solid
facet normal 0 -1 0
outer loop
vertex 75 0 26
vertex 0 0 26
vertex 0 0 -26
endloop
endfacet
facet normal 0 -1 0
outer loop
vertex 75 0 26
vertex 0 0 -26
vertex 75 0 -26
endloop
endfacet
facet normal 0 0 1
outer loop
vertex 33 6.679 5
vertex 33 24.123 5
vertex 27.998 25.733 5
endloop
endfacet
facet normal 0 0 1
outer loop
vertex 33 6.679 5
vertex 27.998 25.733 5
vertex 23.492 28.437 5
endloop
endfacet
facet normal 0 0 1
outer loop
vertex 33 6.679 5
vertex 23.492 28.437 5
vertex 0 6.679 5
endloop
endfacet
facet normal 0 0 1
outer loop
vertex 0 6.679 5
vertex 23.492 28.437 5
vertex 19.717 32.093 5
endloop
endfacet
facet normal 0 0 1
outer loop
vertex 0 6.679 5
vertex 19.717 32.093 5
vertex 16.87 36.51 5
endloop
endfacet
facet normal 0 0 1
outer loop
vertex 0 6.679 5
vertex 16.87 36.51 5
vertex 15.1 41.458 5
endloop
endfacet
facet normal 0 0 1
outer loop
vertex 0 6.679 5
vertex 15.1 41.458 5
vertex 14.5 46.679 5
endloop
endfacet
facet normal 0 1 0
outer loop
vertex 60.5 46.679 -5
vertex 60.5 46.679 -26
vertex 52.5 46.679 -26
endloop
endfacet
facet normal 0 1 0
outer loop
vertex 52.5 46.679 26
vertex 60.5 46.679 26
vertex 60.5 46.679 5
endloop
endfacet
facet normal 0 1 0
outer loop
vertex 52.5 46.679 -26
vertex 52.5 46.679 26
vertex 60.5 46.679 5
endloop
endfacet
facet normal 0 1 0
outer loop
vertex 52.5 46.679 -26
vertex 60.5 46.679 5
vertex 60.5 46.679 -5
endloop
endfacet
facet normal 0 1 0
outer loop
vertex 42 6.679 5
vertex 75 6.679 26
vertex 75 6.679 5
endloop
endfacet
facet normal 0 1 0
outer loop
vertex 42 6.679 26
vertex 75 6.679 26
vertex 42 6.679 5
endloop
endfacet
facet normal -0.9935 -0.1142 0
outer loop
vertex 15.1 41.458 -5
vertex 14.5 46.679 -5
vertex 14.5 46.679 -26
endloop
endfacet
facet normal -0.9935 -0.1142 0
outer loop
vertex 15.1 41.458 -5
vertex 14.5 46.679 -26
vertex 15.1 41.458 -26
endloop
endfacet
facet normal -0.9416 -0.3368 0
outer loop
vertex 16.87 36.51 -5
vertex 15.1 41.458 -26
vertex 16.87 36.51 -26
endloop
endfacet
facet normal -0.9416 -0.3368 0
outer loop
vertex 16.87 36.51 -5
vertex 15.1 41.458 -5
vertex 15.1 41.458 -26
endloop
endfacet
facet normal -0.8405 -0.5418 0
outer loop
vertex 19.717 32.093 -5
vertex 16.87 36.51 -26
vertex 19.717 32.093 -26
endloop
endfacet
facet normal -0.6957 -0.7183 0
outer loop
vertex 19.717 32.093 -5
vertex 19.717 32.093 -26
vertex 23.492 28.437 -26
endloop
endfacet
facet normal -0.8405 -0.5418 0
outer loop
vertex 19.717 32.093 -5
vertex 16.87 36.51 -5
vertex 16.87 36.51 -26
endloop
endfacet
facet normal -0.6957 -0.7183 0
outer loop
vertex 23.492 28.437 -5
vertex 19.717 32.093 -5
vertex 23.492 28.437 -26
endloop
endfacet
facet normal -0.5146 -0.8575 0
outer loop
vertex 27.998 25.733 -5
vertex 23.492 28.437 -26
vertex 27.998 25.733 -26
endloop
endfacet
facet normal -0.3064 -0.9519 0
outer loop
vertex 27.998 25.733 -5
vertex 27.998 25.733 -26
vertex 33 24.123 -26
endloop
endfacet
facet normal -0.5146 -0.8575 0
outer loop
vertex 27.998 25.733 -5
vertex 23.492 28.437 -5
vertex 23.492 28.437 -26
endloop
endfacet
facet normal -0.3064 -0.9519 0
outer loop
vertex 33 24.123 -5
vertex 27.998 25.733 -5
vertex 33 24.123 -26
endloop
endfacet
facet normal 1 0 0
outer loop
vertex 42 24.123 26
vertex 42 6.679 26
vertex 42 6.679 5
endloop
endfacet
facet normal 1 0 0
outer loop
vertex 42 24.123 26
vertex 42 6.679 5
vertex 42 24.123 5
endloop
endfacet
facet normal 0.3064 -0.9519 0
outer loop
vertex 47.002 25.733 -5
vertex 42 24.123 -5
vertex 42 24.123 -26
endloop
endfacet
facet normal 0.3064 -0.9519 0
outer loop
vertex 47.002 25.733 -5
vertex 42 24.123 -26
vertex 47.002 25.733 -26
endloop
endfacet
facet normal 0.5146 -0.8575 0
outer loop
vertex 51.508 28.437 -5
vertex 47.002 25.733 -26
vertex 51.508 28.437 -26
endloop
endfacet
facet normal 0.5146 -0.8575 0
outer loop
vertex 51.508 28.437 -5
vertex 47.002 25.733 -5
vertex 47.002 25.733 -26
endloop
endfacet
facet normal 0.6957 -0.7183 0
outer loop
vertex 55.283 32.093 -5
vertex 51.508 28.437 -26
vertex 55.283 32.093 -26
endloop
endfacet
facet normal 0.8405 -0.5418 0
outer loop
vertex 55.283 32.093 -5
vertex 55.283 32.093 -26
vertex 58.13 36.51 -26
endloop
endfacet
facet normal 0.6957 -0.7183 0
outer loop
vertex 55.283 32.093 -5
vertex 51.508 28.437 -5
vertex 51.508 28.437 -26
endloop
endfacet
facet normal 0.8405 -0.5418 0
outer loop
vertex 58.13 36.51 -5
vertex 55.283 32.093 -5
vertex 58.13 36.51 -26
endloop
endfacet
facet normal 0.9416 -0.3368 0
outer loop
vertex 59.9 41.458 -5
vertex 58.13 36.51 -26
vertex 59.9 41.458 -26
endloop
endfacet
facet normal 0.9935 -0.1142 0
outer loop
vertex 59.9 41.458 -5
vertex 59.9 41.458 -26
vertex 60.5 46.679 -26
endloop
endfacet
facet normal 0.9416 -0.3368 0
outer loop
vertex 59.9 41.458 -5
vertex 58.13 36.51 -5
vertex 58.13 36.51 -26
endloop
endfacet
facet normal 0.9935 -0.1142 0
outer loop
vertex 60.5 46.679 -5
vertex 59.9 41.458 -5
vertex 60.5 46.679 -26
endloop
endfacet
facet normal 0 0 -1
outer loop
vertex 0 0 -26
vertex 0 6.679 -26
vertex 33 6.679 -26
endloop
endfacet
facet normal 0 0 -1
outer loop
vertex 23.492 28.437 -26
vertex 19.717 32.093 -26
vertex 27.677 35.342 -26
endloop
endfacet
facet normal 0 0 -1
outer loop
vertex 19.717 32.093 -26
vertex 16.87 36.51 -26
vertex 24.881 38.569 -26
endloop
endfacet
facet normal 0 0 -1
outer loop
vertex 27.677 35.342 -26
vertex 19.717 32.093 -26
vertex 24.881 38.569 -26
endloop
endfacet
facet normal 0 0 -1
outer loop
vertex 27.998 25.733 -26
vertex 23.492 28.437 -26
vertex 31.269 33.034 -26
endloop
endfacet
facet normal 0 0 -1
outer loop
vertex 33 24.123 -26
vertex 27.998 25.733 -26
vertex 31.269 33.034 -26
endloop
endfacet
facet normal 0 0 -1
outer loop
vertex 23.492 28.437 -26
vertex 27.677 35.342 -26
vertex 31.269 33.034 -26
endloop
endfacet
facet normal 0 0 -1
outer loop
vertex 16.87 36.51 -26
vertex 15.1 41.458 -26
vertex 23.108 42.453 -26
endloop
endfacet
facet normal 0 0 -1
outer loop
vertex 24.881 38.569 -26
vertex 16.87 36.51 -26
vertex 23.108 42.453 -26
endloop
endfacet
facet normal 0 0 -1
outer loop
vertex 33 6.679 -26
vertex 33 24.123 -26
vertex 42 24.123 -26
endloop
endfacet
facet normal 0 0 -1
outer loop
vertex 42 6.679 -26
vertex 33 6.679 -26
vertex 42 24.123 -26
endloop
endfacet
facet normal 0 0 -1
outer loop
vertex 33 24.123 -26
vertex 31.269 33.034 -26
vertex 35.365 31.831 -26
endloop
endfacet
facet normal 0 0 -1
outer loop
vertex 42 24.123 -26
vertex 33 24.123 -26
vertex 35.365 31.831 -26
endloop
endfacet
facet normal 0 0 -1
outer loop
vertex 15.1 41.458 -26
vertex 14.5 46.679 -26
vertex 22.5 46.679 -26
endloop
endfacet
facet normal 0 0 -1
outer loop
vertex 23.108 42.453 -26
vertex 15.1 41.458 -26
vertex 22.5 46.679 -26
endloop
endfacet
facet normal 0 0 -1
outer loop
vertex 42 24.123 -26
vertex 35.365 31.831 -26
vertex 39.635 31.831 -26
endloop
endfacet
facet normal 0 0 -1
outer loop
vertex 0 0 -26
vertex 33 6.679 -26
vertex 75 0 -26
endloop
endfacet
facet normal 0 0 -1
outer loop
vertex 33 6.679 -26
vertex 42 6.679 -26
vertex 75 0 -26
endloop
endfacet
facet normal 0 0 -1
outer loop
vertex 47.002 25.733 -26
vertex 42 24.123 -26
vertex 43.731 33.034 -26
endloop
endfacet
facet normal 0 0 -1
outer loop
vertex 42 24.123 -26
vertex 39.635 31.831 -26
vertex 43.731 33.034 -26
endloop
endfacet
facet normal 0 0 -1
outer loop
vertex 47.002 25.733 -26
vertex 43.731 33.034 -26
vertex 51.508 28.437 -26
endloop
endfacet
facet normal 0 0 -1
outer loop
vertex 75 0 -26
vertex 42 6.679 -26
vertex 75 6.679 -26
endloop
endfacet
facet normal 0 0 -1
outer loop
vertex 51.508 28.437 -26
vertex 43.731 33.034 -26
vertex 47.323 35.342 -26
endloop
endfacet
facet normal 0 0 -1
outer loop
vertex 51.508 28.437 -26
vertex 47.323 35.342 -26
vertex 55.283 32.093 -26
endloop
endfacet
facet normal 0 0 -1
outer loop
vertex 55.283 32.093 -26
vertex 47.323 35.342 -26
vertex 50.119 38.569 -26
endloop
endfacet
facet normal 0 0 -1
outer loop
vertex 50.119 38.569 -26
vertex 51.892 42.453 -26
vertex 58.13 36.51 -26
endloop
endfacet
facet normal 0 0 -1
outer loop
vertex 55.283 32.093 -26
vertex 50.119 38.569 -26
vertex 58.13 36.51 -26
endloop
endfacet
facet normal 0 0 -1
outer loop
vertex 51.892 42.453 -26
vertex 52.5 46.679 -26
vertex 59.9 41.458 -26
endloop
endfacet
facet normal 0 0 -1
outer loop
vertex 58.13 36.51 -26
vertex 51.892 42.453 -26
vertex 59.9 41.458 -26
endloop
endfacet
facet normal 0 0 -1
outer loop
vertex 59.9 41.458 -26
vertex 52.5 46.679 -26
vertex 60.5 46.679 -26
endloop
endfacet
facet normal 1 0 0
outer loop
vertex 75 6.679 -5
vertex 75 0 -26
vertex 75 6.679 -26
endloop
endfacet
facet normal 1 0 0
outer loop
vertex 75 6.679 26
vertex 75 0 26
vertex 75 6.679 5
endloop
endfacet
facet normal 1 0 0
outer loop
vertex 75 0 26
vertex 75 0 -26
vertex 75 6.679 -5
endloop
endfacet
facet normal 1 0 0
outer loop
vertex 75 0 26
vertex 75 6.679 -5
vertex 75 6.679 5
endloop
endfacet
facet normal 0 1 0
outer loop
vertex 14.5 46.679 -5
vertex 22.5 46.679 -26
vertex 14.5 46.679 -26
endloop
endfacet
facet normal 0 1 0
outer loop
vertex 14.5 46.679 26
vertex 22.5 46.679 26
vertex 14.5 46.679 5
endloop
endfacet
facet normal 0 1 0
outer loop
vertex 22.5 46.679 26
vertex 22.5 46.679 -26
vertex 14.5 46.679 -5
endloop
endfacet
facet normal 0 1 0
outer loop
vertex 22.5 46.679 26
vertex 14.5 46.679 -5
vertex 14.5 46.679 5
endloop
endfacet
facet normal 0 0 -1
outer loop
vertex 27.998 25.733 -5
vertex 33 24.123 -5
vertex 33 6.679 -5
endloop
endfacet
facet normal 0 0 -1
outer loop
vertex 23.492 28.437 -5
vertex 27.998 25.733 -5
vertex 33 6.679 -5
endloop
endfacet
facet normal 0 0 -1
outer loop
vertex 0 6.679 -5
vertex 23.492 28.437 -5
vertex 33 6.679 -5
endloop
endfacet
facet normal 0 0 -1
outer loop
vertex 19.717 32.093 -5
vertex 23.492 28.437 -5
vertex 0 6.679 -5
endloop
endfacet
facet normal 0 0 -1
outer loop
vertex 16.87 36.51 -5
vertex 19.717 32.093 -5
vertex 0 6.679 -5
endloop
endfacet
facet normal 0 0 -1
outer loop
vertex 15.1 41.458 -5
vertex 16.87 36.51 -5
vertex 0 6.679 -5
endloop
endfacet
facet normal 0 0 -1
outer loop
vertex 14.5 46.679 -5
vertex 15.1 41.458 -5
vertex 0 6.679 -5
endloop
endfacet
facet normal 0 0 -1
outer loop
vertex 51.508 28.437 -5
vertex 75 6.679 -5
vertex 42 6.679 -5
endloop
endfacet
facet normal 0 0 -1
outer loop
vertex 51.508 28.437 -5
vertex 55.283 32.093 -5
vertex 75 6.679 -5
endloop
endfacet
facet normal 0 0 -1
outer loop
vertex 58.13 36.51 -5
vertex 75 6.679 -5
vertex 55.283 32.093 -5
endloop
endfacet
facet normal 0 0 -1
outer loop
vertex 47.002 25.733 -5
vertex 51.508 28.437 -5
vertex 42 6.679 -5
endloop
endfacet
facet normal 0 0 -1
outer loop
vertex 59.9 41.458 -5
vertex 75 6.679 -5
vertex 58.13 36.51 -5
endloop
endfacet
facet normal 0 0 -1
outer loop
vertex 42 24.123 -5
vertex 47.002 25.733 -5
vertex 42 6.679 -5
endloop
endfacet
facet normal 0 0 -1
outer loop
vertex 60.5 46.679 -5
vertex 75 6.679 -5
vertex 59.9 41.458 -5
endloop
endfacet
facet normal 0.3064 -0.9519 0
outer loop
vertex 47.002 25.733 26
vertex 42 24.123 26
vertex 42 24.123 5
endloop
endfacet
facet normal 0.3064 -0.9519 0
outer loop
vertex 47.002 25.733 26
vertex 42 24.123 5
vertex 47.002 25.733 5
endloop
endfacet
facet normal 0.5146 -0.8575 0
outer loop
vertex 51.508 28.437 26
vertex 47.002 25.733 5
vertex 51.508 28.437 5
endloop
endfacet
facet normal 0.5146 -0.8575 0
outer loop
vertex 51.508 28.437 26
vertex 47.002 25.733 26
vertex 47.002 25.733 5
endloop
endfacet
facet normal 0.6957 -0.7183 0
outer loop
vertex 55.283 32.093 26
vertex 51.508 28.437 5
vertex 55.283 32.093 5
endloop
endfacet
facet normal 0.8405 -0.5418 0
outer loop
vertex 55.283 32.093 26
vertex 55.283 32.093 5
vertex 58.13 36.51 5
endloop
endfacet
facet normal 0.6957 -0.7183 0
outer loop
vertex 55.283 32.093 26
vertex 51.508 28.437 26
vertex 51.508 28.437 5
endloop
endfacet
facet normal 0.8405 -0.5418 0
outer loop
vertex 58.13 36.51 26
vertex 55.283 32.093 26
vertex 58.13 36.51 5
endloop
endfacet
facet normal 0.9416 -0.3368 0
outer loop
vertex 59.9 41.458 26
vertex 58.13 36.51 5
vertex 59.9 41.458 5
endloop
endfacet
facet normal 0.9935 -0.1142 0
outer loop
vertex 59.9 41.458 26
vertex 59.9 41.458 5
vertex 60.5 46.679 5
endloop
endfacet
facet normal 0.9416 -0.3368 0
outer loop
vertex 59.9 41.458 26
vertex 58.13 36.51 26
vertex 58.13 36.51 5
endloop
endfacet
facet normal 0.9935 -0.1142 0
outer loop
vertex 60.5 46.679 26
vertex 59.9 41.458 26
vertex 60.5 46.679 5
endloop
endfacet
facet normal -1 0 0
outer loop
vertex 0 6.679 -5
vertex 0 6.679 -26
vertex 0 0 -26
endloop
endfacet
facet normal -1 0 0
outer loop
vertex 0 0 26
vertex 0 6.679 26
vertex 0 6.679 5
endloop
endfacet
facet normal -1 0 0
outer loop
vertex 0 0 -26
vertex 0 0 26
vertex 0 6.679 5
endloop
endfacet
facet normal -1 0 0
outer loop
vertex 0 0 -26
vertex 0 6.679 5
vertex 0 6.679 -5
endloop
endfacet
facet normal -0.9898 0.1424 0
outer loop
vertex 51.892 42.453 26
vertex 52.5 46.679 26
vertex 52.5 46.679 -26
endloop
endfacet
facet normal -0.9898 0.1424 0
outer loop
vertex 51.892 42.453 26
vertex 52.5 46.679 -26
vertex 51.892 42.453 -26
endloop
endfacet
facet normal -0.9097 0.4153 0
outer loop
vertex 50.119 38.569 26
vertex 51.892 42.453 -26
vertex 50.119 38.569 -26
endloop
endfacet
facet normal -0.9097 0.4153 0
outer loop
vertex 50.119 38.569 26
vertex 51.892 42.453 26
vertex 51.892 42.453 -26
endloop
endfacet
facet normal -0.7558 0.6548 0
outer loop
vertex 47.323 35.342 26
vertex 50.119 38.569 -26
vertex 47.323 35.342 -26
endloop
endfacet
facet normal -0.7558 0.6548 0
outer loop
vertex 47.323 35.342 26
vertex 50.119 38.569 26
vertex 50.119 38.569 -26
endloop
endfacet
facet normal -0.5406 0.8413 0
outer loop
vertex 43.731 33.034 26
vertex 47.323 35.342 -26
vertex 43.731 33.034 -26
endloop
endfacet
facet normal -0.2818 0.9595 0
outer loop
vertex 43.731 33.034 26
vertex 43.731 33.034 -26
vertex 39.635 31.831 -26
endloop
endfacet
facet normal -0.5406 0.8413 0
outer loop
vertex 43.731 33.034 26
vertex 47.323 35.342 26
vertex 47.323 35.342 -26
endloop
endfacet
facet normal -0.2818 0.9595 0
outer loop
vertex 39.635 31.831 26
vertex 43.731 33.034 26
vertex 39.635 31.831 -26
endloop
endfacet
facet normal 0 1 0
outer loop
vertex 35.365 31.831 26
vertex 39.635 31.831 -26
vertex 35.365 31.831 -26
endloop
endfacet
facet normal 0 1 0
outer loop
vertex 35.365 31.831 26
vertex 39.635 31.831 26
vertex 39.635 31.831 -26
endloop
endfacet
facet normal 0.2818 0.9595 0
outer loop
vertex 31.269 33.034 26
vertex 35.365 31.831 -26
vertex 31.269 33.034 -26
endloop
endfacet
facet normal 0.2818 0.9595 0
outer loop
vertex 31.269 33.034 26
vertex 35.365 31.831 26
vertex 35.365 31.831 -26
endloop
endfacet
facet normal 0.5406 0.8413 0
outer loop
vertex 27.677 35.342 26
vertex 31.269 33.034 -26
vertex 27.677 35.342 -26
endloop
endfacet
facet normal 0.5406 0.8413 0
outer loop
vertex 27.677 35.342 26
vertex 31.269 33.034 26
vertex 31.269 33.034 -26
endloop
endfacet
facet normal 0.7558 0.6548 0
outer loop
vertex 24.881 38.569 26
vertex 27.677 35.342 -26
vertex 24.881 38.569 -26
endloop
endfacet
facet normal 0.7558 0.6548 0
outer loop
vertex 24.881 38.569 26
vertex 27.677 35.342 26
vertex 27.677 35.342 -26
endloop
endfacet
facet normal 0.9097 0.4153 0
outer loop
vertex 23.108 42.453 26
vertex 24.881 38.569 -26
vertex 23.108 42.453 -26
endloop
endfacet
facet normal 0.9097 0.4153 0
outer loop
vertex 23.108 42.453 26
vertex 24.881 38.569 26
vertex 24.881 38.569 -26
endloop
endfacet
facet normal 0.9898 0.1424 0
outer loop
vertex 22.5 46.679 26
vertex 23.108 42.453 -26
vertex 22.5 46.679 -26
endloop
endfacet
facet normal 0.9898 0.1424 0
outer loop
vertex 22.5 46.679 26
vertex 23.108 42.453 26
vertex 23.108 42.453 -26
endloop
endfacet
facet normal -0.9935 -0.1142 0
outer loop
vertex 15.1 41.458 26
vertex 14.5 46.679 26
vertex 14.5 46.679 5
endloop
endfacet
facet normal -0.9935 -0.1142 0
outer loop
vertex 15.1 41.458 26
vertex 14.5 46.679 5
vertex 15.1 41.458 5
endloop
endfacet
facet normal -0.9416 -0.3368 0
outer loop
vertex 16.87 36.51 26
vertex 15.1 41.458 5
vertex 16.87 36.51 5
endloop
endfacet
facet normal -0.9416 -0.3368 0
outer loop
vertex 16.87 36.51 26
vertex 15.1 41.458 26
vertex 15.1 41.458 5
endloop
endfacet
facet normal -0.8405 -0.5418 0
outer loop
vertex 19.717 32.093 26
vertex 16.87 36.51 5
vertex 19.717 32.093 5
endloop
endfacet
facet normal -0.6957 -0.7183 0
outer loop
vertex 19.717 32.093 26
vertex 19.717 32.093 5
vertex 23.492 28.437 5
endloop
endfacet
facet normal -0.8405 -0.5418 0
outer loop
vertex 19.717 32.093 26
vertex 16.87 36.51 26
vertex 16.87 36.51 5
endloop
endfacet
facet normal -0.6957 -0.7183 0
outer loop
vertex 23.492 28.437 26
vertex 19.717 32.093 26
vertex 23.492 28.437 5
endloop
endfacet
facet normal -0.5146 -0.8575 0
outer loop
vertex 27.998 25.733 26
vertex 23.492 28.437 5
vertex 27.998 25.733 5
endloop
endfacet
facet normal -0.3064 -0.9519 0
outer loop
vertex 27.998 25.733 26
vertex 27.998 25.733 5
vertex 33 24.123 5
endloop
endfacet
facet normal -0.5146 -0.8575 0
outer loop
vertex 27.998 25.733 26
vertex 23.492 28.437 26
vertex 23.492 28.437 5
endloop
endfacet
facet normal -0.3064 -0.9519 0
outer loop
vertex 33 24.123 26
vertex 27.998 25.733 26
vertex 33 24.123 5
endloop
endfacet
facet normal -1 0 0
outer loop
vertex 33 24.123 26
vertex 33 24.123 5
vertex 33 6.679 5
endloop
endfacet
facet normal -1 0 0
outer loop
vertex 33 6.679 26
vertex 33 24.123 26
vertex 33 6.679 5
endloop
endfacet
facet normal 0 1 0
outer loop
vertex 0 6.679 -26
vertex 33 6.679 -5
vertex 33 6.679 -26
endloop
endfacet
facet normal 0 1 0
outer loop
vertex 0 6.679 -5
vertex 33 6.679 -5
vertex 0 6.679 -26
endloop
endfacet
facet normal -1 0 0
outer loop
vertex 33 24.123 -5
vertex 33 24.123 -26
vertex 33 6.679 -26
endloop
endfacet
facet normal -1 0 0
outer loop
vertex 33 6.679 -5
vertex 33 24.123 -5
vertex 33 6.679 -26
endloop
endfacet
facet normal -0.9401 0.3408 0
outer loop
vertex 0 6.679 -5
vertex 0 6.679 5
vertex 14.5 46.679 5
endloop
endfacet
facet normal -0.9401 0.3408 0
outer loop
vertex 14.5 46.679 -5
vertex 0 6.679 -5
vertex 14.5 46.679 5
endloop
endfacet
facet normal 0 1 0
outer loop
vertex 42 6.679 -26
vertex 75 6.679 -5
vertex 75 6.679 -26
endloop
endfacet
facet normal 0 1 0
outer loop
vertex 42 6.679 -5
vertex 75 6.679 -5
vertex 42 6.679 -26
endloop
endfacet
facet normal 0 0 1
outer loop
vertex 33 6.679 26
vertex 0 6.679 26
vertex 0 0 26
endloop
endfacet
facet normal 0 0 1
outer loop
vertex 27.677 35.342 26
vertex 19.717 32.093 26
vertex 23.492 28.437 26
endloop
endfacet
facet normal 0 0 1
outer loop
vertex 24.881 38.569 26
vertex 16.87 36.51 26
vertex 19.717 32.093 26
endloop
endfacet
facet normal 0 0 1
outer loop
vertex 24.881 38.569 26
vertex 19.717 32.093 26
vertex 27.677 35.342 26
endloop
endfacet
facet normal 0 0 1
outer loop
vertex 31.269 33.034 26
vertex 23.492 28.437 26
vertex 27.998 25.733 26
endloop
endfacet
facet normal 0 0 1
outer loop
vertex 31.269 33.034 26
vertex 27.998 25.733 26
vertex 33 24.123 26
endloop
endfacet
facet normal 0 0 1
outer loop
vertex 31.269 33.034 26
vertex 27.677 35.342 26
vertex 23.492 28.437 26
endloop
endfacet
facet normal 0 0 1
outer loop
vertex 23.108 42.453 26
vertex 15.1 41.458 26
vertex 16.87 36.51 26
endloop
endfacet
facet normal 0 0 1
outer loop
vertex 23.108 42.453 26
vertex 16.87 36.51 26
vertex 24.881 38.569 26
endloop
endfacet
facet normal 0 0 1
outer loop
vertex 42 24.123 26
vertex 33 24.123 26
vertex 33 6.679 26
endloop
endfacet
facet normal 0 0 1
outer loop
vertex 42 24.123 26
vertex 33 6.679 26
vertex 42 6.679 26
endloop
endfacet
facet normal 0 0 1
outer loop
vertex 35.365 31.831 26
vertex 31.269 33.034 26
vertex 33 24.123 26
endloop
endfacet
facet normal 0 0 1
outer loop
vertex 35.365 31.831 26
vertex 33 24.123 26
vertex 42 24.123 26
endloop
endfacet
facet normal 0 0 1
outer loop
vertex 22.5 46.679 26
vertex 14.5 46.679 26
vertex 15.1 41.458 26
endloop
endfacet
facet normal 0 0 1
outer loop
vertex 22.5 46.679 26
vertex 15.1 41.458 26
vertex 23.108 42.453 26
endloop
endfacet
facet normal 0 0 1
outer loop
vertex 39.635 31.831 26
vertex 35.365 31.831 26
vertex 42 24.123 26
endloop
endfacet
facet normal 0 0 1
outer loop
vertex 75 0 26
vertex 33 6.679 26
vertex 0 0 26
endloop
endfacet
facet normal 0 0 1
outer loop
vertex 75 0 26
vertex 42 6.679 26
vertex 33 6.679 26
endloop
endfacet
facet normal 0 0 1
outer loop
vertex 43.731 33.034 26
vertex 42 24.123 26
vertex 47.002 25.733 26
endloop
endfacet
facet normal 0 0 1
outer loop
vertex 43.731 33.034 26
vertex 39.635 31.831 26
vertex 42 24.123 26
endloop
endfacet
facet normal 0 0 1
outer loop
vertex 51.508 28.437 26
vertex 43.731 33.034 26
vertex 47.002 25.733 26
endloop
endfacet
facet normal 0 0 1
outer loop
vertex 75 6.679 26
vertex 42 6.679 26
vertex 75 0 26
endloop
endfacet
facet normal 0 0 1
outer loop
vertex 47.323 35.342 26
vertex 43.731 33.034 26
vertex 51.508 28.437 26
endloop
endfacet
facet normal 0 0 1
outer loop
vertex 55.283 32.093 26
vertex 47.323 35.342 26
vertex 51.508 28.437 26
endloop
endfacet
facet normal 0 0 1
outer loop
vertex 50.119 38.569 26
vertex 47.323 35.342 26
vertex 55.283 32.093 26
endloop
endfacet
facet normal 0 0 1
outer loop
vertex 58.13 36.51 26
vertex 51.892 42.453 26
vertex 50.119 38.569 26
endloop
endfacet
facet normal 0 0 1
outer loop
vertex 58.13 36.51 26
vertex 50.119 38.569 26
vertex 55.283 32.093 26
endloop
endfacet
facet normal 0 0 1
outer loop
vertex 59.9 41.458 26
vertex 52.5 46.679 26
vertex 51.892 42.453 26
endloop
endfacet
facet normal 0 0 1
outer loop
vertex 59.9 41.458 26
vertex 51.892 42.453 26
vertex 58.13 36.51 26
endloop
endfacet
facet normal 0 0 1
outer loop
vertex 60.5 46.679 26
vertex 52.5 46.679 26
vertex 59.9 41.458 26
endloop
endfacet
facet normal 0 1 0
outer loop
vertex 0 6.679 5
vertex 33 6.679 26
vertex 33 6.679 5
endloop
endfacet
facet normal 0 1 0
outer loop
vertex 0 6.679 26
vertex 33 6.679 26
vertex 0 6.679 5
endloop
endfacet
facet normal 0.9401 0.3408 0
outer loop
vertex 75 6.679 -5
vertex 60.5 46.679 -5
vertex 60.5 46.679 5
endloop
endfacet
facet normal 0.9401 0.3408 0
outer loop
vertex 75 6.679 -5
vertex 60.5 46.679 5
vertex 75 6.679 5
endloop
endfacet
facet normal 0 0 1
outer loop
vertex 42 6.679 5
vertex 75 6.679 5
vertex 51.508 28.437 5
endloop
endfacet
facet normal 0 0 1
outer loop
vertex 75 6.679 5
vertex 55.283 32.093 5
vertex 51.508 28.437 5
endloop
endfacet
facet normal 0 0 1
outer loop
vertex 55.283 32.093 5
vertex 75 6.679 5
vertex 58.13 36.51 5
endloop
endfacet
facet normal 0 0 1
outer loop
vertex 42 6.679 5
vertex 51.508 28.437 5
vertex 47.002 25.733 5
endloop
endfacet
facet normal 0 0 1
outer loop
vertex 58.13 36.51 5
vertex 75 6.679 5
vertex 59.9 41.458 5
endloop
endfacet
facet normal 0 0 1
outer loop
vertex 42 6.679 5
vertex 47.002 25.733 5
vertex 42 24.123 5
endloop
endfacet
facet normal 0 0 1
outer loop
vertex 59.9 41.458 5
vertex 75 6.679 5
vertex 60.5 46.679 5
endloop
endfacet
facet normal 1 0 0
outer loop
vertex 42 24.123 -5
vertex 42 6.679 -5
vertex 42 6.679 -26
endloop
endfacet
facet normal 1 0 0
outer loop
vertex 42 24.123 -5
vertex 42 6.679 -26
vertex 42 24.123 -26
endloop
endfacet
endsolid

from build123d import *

# Parameters (mm, degrees)
BOSS_EXTRUDE1_DEPTH = 26
BOSS_EXTRUDE2_DEPTH = 5


with BuildPart() as part:
    # Sketch1 → Boss-Extrude1 (new, symmetric)
    with BuildSketch(Plane.XY):
        with BuildLine():
            Line((75, 6.678571429), (42, 6.678571429))
            Line((42, 6.678571429), (42, 24.123084291))
            ThreePointArc((42, 24.123084291), (55.283419244, 32.092619283), (60.5, 46.678571429))
            Line((60.5, 46.678571429), (52.5, 46.678571429))
            ThreePointArc((52.5, 46.678571429), (37.5, 31.678571429), (22.5, 46.678571429))
            Line((22.5, 46.678571429), (14.5, 46.678571429))
            ThreePointArc((14.5, 46.678571429), (19.716580756, 32.092619283), (33, 24.123084291))
            Line((33, 24.123084291), (33, 6.678571429))
            Line((33, 6.678571429), (0, 6.678571429))
            Line((0, 6.678571429), (0, 0))
            Line((0, 0), (75, 0))
            Line((75, 0), (75, 6.678571429))
        make_face()
    extrude(amount=BOSS_EXTRUDE1_DEPTH, both=True)

    # Sketch1<3> → Boss-Extrude2 (add, symmetric)
    with BuildSketch(Plane.XY):
        with BuildLine():
            Line((42, 24.123084291), (42, 6.678571429))
            Line((42, 6.678571429), (75, 6.678571429))
            Line((75, 6.678571429), (60.5, 46.678571429))
            ThreePointArc((60.5, 46.678571429), (55.283419244, 32.092619283), (42, 24.123084291))
        make_face()
        with BuildLine():
            Line((14.5, 46.678571429), (0, 6.678571429))
            Line((0, 6.678571429), (33, 6.678571429))
            Line((33, 6.678571429), (33, 24.123084291))
            ThreePointArc((33, 24.123084291), (19.716580756, 32.092619283), (14.5, 46.678571429))
        make_face()
    extrude(amount=BOSS_EXTRUDE2_DEPTH, both=True)


solid = part.part
